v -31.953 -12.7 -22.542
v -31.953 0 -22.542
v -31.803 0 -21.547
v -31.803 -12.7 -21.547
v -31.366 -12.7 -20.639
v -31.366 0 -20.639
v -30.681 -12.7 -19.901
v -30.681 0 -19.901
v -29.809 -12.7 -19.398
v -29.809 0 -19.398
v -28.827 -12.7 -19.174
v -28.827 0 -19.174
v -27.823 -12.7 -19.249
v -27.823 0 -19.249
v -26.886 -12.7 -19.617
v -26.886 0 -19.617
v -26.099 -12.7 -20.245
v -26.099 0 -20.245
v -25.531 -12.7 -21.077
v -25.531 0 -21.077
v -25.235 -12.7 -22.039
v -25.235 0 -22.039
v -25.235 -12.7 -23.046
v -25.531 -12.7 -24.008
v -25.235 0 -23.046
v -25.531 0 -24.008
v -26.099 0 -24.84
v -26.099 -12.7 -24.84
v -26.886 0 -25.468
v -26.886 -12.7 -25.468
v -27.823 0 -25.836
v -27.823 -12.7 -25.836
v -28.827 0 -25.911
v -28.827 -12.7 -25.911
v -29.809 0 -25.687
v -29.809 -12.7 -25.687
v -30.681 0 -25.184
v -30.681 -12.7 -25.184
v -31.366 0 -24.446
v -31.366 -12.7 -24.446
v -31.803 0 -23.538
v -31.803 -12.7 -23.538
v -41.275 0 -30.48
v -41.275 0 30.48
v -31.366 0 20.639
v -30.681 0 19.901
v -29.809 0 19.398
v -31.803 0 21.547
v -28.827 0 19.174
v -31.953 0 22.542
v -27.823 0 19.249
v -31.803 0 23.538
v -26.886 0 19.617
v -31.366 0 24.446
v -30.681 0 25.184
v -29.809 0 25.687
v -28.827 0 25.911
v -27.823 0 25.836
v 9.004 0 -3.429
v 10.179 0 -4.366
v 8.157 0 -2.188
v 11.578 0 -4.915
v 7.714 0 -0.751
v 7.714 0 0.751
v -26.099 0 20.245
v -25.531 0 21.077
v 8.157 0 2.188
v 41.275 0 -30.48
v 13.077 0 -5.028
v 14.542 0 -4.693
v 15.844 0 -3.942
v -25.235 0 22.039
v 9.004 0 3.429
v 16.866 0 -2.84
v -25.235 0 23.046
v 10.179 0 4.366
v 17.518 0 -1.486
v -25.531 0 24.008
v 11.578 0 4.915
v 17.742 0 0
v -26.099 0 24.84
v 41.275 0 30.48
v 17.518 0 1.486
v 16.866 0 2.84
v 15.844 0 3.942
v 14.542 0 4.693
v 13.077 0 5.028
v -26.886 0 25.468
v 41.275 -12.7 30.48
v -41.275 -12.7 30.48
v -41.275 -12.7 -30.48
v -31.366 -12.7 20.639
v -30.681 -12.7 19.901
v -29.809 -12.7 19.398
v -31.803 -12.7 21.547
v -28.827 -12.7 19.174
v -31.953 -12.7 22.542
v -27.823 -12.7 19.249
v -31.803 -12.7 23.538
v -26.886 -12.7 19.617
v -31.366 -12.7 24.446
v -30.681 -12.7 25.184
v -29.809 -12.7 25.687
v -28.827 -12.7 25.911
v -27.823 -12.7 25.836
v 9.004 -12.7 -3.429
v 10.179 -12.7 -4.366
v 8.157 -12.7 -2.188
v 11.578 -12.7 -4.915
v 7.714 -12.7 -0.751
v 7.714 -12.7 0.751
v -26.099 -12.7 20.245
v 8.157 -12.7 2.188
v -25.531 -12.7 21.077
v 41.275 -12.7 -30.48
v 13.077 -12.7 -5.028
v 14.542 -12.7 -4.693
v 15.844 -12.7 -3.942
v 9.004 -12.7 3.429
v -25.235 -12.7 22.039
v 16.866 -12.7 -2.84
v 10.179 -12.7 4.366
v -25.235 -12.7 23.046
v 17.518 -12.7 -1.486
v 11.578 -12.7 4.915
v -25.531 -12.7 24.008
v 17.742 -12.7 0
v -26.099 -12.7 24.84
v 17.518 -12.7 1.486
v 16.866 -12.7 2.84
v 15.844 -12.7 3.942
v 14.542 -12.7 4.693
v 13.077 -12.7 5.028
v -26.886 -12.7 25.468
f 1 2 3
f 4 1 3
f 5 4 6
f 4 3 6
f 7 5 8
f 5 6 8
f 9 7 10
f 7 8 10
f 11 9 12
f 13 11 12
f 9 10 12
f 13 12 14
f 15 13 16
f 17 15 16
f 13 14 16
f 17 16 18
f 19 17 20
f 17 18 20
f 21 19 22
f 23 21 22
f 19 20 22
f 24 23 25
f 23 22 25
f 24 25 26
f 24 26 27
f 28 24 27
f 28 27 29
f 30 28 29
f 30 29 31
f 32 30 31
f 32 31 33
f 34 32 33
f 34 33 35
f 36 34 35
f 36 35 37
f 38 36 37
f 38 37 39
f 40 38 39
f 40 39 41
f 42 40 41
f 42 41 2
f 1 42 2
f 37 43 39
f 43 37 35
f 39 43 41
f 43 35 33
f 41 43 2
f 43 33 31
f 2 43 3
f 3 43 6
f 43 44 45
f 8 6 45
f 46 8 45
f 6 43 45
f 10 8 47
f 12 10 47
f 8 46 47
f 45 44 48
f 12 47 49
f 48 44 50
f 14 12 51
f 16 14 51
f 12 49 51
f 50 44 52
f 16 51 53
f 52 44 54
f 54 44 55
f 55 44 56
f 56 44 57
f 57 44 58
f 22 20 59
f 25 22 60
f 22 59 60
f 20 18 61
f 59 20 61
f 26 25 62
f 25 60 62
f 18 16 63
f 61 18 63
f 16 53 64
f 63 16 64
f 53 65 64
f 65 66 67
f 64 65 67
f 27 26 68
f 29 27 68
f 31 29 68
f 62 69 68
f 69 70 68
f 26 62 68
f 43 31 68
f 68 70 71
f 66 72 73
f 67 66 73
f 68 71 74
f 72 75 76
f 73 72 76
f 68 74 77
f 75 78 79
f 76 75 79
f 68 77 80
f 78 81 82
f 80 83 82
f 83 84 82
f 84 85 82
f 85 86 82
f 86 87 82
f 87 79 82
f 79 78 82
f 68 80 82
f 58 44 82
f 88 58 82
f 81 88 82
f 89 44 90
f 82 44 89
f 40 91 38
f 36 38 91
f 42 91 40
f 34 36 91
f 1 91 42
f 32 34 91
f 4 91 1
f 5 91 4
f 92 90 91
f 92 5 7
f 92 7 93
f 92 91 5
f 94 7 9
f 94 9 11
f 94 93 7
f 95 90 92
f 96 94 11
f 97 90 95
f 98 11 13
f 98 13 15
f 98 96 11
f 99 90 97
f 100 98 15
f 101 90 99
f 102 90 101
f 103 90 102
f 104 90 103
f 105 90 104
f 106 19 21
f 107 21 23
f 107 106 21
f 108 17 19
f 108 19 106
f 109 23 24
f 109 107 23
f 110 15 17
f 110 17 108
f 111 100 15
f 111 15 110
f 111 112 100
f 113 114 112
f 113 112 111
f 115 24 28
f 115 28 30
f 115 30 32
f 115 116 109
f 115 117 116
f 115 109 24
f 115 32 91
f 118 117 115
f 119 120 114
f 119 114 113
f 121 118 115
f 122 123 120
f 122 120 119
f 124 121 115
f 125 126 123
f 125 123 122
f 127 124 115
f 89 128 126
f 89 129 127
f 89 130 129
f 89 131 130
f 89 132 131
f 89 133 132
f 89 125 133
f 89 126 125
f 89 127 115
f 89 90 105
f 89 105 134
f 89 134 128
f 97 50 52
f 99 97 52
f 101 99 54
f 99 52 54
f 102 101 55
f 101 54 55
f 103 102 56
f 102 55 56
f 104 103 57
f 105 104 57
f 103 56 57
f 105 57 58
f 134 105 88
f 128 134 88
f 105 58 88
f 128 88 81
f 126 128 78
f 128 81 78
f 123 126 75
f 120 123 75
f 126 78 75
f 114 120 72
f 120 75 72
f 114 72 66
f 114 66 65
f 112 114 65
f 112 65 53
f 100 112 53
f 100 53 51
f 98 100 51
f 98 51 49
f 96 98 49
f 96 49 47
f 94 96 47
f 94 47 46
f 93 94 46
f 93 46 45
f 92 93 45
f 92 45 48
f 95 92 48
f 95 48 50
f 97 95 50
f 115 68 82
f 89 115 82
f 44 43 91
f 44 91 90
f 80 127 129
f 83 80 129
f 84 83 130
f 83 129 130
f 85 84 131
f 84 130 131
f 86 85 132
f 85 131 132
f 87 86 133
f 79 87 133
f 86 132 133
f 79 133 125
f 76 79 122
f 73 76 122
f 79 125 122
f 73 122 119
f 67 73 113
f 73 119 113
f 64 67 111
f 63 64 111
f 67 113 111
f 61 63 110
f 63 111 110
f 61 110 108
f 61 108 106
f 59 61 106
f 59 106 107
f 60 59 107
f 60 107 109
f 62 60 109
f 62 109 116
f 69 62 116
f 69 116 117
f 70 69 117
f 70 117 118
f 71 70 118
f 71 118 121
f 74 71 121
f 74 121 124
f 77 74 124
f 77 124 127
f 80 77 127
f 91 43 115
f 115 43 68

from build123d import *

# Parameters (mm, degrees)
F0_W     = 82.55
F0_H     = 60.96
F1_DEPTH = 12.7
F3_D     = 10.0838
F5_D     = 6.7564


with BuildPart() as f1:
    # F0 (on Front) → F1 (new body)
    with BuildSketch(Plane.XZ):
        Rectangle(F0_W, F0_H)
    extrude(amount=F1_DEPTH)

    # F3 (through all)
    with Locations(Plane(origin=(0, 0, 0), x_dir=(-1, 0, 0), z_dir=(0, 1, 0))):
        with Locations((-12.7, 0)):
            Hole(F3_D / 2)

    # F5 (through all)
    with Locations(Plane.XZ.offset(12.7)):
        with Locations((-28.575, 22.5425), (-28.575, -22.5425)):
            Hole(F5_D / 2)


solid = f1.part
